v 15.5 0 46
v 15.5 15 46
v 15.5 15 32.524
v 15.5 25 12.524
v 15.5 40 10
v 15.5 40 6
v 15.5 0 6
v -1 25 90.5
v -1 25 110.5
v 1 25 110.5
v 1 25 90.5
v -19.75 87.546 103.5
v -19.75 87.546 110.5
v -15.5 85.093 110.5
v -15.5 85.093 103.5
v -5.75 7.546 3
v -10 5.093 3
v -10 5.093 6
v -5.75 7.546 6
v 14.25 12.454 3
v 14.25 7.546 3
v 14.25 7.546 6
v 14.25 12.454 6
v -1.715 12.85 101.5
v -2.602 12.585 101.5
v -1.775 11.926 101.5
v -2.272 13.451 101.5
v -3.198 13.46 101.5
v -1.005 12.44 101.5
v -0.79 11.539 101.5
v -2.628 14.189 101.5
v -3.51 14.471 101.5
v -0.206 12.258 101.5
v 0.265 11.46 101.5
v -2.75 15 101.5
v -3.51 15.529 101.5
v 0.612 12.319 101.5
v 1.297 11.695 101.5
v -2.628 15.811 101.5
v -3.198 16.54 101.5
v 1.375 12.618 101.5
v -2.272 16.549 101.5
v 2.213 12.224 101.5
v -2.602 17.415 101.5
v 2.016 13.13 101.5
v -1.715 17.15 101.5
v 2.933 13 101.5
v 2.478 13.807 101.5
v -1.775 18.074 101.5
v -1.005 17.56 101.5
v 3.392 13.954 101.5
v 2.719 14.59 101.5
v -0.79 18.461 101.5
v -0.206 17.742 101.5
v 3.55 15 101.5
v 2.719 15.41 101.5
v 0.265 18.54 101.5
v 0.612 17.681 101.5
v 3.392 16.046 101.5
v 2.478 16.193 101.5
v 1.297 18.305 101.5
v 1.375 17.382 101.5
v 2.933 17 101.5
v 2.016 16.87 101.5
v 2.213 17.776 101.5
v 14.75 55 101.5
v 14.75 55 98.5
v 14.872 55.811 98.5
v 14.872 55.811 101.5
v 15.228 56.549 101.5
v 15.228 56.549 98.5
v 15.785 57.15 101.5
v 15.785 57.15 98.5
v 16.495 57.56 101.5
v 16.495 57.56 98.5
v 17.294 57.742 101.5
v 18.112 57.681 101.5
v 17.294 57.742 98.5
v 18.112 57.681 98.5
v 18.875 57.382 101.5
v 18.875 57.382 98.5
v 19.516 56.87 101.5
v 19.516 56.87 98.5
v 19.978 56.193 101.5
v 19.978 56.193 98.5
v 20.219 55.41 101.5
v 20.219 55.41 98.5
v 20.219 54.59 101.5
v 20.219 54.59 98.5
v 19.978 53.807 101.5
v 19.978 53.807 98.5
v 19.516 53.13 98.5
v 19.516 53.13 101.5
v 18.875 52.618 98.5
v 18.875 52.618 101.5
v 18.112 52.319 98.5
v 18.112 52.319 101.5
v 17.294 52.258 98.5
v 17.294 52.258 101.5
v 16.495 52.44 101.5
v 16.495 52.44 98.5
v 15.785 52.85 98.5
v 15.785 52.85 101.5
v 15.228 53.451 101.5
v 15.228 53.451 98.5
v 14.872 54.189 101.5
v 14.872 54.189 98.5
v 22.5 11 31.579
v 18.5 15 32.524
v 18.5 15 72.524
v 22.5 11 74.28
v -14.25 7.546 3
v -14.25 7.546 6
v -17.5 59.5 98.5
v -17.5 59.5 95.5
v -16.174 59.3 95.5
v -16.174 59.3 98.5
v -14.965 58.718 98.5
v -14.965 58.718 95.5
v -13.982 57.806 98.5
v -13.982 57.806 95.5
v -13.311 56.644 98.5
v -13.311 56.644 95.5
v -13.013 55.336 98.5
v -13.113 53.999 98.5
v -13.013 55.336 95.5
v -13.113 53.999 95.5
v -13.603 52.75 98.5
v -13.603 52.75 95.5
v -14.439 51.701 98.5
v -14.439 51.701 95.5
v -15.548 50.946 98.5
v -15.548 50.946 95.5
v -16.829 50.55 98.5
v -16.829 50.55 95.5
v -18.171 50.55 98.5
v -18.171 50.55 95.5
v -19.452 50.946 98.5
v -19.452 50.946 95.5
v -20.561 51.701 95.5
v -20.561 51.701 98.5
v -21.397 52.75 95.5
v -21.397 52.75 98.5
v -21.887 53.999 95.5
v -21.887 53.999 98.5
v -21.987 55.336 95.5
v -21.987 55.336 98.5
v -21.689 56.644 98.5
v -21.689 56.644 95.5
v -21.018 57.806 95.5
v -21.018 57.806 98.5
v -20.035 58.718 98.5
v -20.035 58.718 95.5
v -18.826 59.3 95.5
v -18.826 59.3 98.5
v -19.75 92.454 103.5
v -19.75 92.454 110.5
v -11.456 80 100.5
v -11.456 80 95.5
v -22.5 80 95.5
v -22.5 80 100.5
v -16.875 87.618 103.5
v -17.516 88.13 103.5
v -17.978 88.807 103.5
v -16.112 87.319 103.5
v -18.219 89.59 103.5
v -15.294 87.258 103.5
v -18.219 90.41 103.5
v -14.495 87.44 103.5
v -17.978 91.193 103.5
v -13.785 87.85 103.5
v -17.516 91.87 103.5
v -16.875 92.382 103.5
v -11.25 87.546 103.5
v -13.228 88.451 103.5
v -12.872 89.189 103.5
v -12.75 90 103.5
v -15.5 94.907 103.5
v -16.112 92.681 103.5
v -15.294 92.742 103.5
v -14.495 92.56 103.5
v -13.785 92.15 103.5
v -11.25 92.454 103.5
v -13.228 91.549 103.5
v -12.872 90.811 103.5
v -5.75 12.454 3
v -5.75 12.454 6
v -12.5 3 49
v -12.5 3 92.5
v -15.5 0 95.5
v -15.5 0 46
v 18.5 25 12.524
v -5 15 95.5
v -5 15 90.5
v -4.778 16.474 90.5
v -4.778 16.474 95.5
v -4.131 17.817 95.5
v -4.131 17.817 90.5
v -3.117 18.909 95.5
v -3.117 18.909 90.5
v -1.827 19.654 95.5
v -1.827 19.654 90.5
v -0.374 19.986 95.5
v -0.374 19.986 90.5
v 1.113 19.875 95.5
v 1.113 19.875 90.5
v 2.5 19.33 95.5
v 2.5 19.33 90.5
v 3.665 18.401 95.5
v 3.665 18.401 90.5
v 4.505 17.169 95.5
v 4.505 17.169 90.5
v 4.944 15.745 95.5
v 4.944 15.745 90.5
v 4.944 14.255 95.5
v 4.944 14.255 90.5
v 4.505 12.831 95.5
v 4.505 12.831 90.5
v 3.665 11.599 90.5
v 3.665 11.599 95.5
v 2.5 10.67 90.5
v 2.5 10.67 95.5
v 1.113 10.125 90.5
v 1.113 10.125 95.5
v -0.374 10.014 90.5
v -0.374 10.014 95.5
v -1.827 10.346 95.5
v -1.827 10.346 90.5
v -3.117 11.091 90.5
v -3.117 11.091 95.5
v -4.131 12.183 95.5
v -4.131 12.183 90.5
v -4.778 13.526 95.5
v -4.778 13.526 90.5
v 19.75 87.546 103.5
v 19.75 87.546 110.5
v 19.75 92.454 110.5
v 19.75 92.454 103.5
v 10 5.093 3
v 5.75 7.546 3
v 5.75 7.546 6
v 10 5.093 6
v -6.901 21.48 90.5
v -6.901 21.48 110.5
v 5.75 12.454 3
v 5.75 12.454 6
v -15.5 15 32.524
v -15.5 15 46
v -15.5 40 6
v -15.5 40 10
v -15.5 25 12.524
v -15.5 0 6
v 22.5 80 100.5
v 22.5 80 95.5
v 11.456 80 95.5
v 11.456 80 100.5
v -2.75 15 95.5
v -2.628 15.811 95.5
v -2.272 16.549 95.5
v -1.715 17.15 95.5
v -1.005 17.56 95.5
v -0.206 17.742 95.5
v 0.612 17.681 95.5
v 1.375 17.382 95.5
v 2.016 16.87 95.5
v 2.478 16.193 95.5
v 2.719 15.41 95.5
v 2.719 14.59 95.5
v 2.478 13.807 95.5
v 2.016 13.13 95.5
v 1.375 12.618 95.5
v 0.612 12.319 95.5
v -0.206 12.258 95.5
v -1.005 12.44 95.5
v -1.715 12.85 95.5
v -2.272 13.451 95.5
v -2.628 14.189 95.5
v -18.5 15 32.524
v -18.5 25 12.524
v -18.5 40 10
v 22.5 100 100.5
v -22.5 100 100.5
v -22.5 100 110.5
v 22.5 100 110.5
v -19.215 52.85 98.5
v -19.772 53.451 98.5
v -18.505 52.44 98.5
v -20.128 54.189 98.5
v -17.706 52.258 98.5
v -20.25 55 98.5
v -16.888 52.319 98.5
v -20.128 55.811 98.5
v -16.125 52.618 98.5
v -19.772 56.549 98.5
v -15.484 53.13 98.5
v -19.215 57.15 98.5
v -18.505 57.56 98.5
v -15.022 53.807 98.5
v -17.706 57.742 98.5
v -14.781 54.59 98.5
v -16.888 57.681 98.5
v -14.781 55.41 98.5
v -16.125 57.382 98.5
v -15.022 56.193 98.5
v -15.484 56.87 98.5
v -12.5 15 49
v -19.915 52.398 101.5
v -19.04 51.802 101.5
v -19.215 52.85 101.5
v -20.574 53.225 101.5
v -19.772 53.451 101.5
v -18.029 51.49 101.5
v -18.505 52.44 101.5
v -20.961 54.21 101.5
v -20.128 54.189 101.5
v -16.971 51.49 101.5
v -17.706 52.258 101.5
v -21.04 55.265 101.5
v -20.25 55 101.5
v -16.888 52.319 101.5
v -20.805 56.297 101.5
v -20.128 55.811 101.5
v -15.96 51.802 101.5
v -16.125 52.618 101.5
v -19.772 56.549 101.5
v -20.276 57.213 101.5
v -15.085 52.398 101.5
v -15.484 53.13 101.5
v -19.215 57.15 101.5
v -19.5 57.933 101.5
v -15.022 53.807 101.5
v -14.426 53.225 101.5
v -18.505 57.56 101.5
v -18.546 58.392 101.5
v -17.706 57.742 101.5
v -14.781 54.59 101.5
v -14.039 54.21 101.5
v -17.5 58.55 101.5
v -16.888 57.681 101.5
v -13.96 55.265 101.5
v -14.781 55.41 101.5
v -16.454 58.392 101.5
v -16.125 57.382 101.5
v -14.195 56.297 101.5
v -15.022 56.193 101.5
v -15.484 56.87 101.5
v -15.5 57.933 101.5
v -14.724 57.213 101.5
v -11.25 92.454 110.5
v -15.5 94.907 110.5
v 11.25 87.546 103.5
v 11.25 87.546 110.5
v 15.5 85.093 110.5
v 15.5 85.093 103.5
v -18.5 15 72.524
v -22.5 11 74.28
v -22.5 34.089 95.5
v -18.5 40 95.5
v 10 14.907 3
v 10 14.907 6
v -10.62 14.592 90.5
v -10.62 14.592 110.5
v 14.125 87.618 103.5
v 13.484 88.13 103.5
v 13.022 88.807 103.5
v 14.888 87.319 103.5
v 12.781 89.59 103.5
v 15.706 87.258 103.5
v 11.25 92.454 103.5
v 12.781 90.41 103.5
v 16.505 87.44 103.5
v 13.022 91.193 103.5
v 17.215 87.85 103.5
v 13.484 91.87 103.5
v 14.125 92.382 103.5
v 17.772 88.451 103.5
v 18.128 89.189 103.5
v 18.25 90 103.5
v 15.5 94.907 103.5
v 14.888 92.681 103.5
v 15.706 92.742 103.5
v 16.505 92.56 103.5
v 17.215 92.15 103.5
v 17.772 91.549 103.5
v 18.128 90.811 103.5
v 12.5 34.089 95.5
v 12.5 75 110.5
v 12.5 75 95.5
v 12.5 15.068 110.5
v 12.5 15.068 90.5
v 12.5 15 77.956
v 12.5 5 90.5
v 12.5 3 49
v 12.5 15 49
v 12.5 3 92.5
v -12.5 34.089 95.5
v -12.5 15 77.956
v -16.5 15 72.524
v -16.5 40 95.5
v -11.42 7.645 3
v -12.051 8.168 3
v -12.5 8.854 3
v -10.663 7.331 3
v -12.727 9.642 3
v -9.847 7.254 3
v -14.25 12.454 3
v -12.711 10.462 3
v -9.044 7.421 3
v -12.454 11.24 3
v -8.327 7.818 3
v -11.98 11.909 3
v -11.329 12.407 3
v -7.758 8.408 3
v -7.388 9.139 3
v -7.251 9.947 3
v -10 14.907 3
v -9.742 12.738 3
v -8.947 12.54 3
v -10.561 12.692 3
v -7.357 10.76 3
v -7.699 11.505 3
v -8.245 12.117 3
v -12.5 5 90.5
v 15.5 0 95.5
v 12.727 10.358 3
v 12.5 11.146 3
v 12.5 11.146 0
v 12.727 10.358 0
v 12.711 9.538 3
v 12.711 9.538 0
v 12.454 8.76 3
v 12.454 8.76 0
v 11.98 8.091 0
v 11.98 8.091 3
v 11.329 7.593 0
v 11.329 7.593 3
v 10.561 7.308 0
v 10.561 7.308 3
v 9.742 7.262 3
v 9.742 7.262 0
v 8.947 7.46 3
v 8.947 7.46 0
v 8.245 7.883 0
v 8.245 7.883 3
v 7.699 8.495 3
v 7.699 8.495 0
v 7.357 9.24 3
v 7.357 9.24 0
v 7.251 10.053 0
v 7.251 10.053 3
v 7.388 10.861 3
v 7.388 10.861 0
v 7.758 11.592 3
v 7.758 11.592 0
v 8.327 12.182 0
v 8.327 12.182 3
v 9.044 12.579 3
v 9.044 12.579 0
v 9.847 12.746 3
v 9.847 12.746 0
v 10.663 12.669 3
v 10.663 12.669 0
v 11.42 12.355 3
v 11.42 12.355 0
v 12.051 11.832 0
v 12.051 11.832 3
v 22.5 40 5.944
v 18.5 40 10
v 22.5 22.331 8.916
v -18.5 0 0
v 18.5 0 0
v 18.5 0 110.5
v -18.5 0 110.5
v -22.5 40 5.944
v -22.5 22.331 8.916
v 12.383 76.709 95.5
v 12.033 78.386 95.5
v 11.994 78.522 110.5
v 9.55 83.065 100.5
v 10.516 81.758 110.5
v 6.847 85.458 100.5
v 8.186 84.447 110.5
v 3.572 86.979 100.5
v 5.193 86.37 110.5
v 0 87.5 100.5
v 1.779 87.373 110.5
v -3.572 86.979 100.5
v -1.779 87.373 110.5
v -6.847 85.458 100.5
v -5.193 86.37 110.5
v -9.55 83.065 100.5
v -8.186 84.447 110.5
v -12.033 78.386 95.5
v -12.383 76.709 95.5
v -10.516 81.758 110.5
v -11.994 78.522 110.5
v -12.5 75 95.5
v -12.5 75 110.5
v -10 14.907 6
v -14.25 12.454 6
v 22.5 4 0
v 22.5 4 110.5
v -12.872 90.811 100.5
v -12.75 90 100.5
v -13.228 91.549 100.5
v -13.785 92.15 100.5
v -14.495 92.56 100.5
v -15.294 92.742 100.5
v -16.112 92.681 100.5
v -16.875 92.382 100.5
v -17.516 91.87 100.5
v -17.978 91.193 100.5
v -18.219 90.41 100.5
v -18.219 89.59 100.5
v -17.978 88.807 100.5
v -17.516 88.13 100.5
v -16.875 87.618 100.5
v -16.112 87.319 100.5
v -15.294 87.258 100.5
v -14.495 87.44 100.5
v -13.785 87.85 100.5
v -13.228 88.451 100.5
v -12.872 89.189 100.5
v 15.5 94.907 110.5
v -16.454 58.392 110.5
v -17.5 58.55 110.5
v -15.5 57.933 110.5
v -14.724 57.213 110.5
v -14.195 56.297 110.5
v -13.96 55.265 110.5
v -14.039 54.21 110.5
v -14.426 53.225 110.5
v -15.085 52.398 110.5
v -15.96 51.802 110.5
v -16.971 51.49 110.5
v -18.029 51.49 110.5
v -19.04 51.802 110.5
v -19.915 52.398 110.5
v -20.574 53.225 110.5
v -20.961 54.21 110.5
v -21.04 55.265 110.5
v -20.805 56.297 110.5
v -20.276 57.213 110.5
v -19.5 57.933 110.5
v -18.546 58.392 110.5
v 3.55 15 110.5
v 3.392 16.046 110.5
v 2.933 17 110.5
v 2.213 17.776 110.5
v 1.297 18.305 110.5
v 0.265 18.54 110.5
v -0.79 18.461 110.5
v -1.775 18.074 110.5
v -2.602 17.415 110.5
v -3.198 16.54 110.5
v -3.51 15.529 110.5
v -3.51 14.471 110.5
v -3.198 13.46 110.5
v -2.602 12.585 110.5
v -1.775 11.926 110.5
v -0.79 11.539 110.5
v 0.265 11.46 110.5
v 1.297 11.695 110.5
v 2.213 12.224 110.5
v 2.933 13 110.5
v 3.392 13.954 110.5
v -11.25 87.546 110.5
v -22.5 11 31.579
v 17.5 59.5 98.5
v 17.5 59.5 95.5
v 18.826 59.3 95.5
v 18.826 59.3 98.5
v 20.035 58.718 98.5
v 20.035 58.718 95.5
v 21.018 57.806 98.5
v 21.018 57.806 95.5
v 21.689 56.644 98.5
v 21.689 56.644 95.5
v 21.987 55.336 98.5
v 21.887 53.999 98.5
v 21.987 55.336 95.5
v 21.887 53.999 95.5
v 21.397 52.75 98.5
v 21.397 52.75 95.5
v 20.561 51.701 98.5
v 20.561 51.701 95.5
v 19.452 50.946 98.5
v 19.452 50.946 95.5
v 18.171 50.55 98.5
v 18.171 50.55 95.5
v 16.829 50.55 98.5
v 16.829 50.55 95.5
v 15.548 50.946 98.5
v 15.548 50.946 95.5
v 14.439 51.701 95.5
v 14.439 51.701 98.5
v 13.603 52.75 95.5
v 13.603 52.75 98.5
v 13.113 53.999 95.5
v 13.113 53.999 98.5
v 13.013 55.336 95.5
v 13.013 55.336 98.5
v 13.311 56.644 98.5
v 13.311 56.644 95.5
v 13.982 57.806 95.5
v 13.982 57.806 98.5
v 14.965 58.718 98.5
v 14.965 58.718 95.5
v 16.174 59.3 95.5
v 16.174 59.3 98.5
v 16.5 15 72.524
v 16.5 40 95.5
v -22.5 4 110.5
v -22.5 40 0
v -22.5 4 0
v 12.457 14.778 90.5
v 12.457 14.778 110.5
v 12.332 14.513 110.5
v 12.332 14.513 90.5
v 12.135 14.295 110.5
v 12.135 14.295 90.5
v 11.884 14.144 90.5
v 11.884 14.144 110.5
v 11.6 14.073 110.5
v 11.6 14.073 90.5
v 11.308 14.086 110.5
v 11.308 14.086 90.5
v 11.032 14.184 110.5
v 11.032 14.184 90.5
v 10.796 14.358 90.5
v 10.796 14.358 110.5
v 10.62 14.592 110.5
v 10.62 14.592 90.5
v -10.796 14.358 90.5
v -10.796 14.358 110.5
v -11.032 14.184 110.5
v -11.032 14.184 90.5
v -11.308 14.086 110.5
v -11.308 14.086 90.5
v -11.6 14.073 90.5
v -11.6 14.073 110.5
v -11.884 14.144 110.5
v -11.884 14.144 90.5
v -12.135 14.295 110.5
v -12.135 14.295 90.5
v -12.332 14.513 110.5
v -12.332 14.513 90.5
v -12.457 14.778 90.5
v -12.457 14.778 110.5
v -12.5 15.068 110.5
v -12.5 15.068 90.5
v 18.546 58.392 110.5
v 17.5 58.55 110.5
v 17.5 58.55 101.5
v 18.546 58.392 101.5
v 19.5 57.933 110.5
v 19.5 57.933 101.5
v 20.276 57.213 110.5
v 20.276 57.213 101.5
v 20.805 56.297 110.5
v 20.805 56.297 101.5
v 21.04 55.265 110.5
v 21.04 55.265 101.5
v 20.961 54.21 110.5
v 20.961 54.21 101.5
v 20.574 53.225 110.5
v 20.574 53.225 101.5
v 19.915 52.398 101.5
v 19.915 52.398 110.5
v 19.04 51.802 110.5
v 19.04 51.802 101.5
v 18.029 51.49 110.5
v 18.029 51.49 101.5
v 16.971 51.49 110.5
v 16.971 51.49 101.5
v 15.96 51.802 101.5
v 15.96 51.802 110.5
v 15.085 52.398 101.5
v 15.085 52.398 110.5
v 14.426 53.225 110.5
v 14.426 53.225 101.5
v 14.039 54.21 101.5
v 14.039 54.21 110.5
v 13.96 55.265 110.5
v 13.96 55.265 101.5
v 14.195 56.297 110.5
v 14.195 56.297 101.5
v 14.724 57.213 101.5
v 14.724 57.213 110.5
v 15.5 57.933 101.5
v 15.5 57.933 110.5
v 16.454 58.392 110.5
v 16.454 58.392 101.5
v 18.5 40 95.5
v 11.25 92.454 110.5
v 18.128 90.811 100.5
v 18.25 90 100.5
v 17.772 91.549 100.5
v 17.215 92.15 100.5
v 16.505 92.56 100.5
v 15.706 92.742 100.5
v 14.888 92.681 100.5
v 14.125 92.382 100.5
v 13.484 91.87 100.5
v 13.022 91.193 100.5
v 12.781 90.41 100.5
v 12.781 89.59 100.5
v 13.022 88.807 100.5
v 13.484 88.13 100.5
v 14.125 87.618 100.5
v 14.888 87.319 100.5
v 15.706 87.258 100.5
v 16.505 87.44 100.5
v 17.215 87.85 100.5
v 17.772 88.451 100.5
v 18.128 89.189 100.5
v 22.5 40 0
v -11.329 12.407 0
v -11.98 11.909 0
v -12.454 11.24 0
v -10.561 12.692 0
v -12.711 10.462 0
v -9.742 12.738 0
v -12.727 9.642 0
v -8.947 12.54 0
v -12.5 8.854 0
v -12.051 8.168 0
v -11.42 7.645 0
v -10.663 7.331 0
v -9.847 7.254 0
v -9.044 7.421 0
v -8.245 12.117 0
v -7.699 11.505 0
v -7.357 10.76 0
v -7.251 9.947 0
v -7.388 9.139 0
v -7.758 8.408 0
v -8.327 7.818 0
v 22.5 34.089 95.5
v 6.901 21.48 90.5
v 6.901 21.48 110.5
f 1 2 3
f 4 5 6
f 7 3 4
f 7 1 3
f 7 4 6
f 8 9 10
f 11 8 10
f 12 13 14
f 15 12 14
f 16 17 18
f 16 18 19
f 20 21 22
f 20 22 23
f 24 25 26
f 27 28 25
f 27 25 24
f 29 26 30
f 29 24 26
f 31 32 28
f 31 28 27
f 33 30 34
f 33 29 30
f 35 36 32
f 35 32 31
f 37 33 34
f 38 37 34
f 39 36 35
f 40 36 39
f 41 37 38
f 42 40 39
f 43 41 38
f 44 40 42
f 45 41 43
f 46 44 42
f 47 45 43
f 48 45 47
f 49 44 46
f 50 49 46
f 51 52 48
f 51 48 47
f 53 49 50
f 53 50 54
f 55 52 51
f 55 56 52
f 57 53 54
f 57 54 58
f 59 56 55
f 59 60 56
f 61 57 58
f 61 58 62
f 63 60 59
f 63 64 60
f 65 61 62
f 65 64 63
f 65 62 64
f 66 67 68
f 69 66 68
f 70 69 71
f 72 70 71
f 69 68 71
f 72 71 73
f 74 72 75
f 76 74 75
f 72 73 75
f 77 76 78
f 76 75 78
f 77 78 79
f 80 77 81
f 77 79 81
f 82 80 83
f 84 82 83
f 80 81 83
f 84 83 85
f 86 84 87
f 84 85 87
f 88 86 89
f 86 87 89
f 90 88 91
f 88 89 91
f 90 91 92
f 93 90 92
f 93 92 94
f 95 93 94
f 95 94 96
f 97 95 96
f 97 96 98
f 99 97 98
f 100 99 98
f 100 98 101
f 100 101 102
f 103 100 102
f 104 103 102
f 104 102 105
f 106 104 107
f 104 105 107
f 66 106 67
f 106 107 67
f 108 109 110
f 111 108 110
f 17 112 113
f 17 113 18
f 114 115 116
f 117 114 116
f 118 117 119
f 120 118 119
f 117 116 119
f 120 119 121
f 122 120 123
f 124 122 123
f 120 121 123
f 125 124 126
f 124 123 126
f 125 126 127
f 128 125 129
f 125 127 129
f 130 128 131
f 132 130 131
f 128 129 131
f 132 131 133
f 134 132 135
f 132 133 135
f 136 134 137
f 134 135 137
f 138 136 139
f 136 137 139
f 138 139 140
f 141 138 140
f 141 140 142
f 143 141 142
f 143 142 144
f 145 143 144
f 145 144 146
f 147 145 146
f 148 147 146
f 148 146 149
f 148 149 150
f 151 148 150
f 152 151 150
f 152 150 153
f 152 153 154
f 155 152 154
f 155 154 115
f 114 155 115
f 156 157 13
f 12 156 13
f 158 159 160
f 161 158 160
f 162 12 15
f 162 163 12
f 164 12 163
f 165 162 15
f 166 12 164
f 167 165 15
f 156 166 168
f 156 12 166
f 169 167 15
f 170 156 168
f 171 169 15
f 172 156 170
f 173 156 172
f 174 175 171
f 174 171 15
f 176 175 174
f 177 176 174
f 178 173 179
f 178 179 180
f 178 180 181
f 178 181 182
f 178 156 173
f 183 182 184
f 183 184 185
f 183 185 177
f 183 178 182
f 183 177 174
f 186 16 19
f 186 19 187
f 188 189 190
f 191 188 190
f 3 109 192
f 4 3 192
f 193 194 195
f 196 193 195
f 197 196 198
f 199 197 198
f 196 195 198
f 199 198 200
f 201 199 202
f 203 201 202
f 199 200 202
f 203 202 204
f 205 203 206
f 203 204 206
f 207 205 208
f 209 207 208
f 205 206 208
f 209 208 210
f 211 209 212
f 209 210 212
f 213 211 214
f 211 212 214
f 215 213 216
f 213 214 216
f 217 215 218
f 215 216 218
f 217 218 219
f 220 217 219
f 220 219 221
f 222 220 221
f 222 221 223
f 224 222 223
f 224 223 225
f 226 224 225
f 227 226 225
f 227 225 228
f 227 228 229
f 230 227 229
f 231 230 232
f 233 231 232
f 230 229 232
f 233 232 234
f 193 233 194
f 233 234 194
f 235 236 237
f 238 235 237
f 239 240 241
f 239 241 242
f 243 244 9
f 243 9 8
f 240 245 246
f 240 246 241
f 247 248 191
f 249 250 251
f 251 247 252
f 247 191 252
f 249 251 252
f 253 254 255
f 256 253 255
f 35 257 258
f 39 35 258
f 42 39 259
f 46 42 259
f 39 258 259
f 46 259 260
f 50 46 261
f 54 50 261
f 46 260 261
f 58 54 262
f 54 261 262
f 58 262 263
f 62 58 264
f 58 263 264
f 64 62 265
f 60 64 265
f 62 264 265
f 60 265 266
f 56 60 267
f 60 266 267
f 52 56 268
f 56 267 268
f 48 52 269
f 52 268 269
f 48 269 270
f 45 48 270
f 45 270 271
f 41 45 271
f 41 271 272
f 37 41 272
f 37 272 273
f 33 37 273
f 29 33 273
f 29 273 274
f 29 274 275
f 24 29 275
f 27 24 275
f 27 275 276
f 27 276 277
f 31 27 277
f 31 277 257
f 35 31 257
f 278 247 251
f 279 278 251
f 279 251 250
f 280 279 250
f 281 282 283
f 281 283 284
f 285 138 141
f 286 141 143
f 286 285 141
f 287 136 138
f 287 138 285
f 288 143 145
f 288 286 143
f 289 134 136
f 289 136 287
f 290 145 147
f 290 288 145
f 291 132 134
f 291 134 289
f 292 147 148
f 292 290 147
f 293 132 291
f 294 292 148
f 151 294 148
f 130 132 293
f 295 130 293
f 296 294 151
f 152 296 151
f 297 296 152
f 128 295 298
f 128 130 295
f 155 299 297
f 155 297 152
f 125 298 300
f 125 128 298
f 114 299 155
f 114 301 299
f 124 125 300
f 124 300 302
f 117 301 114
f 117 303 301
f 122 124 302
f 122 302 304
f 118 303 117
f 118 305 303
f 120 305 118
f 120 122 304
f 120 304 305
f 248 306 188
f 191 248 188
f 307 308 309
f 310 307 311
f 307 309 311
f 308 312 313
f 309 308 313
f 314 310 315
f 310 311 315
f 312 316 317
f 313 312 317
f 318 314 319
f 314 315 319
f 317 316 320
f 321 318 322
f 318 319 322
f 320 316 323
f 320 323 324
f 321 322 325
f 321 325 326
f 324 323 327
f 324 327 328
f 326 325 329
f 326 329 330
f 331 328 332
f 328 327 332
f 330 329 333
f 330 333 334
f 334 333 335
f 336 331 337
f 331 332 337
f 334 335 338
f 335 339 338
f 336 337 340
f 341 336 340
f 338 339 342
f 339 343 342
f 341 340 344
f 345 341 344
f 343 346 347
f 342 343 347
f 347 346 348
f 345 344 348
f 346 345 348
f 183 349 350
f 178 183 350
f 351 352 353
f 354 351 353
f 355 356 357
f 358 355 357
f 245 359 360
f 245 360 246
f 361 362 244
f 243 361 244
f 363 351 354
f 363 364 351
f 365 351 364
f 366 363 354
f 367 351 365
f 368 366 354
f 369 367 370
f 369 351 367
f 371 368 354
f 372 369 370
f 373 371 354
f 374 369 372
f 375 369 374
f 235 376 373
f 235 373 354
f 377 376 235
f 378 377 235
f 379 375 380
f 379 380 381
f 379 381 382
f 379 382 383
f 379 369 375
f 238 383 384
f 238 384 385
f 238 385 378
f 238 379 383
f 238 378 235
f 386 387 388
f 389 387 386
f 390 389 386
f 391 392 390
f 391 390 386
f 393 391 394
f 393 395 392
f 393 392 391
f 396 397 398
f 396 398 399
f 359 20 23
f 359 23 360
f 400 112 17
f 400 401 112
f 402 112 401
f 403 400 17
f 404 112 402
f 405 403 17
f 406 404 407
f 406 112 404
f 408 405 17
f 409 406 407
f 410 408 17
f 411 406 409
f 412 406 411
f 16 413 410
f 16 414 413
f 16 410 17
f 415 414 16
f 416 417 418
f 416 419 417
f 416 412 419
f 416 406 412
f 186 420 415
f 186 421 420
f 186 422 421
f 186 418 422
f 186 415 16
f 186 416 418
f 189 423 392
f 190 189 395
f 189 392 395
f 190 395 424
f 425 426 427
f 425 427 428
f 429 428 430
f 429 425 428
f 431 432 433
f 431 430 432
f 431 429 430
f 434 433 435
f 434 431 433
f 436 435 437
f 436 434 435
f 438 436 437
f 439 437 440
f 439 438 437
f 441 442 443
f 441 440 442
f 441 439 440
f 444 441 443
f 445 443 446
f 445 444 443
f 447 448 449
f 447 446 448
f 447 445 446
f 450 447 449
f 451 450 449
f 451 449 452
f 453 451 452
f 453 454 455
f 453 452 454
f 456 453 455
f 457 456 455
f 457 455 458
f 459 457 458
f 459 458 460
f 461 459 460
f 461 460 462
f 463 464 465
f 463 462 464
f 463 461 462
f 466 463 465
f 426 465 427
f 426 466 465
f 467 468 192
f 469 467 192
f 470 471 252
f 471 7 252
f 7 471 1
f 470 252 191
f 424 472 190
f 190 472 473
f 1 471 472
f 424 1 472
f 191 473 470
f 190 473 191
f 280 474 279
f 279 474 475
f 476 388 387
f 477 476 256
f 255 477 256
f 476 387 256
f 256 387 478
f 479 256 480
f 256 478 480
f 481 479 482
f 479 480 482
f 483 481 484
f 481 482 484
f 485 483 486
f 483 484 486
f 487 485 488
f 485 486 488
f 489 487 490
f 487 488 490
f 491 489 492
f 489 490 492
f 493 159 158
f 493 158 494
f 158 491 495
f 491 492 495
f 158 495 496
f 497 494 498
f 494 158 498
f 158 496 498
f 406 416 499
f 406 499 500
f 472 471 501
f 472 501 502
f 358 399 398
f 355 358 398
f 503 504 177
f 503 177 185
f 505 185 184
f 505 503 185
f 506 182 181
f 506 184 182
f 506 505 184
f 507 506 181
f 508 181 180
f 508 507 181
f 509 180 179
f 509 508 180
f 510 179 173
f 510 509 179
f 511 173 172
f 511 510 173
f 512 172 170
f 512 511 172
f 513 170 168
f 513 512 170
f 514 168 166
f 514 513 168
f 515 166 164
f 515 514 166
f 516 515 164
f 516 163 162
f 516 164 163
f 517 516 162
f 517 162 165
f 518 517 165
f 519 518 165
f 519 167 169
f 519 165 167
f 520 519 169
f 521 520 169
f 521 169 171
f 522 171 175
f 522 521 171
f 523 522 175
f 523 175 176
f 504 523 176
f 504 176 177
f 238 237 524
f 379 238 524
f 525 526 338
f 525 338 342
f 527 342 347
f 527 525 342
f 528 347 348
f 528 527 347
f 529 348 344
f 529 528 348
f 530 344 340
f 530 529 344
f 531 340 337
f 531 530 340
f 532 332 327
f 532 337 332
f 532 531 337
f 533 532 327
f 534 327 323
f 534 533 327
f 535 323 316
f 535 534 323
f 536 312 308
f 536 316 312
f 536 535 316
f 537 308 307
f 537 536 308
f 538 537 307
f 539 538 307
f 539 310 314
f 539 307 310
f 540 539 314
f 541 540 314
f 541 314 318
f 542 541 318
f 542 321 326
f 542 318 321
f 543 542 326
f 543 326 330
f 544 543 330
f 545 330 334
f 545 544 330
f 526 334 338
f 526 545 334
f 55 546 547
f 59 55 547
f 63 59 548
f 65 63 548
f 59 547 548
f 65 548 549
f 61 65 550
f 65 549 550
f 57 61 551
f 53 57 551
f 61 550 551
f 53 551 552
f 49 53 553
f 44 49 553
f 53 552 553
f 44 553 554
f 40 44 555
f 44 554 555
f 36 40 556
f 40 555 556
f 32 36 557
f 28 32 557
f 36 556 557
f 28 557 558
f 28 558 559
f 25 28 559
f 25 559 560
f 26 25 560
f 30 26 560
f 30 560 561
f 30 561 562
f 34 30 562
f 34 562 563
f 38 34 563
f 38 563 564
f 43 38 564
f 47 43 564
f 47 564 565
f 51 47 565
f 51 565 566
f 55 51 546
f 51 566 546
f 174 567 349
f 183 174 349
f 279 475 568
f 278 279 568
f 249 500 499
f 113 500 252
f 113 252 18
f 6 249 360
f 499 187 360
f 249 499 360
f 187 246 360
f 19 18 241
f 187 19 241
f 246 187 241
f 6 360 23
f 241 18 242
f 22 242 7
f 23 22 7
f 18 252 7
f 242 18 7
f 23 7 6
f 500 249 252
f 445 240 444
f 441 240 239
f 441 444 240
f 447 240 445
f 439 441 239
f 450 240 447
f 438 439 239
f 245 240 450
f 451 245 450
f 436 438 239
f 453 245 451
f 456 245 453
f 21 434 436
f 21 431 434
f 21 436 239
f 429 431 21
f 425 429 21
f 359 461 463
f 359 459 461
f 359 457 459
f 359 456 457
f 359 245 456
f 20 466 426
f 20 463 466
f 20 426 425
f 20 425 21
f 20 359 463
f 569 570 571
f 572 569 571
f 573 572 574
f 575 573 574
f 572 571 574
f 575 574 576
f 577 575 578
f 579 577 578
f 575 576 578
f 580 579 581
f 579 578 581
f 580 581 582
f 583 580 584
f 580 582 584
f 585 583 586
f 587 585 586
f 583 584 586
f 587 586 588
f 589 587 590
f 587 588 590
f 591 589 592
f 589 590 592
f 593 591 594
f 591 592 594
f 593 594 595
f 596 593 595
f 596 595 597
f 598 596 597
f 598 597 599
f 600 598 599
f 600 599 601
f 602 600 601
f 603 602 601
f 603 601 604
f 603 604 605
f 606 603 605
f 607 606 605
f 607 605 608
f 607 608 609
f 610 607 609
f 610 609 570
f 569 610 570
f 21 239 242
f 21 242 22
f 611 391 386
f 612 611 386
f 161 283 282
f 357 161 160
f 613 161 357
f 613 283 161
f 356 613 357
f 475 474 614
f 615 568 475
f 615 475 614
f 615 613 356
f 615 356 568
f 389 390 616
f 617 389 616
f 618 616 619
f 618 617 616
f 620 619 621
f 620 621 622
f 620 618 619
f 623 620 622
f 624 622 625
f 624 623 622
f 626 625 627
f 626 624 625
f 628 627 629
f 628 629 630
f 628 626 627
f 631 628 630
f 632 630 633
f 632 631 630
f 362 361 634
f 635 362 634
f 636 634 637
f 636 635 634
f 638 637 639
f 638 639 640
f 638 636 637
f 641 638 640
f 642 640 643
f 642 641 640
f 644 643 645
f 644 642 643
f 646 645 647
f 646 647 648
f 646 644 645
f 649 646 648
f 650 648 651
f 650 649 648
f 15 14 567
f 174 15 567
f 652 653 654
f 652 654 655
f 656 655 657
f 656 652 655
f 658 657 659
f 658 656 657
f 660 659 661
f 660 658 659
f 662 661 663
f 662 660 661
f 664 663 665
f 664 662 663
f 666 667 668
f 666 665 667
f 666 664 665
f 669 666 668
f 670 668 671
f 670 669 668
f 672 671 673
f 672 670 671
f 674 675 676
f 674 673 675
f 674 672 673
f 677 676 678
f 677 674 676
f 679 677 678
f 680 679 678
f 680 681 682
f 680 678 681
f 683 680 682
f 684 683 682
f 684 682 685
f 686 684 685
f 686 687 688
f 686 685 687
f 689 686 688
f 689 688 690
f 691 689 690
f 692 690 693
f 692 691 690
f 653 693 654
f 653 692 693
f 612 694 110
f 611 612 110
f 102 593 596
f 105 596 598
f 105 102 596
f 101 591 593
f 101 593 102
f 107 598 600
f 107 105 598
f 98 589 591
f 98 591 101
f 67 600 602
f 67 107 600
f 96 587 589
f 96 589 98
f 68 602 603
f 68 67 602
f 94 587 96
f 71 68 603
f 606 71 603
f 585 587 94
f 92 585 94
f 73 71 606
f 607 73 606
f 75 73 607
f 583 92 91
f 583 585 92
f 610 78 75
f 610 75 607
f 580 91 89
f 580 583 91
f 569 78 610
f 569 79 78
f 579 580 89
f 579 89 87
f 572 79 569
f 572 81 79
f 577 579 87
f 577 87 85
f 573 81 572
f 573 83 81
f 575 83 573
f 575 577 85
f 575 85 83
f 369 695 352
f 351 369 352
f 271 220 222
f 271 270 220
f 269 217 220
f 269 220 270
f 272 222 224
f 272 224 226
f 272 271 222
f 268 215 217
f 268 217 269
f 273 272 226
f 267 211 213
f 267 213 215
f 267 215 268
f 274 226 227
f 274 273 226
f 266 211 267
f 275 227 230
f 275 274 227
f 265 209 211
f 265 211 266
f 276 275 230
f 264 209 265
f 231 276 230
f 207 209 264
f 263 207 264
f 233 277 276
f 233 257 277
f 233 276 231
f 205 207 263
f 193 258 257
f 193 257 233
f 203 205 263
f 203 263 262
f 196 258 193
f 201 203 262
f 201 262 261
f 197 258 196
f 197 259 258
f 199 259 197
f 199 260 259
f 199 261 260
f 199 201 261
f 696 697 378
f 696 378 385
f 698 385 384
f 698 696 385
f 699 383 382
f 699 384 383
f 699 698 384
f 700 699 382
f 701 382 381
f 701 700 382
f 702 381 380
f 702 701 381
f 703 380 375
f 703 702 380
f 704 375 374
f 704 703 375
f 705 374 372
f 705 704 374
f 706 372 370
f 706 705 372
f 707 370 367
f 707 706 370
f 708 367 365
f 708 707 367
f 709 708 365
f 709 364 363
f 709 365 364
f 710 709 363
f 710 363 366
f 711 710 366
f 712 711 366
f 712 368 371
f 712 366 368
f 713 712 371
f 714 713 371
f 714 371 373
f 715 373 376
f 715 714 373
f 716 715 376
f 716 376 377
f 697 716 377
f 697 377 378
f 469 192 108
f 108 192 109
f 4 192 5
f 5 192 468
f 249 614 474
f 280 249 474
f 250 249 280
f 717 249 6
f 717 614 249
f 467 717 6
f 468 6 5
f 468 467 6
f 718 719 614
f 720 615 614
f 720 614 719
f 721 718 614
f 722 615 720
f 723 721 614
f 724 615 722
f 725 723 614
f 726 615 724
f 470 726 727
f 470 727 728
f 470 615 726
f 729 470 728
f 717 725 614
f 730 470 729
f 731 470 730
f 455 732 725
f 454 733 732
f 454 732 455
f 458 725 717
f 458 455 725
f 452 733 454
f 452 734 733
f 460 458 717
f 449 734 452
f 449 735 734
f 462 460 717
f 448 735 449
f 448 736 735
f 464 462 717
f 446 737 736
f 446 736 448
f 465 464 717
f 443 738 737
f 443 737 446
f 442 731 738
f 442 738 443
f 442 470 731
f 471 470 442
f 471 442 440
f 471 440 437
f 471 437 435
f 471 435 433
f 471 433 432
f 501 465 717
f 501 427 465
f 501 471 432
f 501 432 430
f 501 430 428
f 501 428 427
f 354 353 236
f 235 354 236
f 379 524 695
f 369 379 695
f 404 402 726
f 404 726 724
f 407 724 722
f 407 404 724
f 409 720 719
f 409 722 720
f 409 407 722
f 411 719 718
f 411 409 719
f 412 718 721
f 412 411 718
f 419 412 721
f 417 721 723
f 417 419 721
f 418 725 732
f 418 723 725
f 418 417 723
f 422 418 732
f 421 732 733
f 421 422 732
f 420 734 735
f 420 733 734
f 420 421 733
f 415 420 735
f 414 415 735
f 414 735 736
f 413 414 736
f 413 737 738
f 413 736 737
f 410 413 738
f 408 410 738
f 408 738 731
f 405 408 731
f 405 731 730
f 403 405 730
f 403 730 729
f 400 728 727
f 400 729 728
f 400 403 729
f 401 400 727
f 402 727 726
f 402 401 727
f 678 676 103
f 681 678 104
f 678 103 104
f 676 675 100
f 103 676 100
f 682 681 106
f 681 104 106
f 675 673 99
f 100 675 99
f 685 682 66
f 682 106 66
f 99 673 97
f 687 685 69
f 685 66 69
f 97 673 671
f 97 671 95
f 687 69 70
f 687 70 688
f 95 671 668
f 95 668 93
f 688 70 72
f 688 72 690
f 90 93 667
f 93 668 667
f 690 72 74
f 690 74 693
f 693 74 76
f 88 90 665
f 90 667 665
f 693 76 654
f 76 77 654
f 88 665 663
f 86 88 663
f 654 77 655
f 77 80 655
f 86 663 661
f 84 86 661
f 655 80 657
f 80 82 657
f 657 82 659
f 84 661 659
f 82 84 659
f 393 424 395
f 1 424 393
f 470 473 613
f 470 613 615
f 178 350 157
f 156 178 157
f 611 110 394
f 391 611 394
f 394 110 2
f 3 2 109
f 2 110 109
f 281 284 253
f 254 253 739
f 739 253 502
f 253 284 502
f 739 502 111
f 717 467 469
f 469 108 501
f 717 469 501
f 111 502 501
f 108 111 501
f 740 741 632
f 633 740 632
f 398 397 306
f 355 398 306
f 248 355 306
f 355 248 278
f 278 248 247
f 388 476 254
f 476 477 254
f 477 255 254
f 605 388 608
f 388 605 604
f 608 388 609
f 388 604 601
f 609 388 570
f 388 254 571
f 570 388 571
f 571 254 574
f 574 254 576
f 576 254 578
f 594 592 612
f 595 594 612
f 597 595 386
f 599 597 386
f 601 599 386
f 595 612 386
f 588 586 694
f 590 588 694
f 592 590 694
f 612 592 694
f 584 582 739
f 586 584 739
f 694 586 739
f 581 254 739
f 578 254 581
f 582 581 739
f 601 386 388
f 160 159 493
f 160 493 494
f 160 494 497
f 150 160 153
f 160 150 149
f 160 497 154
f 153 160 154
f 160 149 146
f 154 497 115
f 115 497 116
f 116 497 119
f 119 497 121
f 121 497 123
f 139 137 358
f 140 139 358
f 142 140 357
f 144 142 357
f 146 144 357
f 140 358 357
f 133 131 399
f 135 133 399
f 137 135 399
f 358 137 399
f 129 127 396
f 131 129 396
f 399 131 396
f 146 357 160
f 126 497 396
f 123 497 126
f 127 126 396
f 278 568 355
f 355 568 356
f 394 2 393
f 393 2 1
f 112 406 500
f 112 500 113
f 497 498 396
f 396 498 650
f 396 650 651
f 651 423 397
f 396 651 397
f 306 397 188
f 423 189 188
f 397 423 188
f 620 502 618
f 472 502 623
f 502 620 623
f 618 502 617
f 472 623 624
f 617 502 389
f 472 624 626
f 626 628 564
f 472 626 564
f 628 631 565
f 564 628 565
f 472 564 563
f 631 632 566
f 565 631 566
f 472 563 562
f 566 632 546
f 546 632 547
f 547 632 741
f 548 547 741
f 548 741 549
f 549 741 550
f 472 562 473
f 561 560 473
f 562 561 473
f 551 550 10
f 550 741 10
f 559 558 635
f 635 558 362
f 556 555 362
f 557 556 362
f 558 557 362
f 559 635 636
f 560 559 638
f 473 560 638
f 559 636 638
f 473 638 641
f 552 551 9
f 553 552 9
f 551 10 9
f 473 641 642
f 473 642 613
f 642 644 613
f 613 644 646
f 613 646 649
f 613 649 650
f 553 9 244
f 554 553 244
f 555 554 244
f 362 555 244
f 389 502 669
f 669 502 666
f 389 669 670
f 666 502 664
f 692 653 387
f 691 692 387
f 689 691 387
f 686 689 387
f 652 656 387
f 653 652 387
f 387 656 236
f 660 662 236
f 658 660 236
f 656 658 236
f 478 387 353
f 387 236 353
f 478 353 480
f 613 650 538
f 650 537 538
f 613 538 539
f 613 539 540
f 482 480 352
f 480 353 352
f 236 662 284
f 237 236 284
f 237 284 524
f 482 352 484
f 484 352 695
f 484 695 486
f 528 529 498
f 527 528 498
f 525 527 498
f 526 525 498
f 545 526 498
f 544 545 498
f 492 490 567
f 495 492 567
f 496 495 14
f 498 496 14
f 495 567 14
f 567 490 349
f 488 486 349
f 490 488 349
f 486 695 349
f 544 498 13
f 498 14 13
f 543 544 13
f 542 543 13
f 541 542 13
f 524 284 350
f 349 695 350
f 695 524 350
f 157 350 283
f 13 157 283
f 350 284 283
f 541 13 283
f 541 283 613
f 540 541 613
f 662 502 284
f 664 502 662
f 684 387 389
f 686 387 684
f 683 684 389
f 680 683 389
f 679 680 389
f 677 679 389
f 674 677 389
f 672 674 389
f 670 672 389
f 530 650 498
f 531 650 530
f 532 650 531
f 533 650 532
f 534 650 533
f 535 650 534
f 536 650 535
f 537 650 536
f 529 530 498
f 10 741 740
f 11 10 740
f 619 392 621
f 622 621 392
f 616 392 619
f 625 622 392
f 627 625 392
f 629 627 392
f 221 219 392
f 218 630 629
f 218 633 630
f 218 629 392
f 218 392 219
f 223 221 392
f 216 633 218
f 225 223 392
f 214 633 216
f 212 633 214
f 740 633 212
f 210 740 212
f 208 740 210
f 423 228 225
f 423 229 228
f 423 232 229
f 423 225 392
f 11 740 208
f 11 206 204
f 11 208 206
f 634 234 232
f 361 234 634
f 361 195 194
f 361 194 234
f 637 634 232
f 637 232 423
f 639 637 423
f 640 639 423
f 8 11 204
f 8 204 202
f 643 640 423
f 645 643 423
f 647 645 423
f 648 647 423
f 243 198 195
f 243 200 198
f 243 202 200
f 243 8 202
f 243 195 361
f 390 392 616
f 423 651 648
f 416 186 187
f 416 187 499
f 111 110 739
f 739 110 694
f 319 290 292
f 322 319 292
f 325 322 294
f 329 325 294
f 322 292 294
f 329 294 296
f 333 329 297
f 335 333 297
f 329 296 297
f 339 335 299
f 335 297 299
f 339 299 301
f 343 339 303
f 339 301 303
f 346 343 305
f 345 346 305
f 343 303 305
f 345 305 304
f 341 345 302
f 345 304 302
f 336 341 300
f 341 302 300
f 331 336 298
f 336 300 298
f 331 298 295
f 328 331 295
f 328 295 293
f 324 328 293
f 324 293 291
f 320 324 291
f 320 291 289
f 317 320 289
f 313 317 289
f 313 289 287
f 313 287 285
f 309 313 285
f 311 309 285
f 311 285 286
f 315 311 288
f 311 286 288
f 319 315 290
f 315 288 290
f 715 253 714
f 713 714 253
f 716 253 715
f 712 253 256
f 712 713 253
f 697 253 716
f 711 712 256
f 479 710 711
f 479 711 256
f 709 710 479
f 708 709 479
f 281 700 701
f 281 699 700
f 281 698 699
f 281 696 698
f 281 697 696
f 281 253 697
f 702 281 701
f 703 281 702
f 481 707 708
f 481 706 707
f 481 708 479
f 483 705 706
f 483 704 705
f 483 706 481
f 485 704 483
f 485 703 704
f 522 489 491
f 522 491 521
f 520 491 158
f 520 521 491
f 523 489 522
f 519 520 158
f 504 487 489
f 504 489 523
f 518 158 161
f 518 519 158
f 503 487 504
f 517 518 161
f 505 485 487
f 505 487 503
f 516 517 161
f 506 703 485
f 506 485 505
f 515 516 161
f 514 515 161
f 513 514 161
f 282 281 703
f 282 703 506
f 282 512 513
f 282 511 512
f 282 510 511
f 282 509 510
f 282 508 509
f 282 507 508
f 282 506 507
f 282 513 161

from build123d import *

# Parameters (mm, degrees)
SKETCH1_W               = 10
SKETCH1_H               = 110.5
BOSS_EXTRUDE1_DEPTH     = 100
BOSS_EXTRUDE1_2_DEPTH   = 100
SKETCH2_W               = 45
SKETCH2_H               = 40
BOSS_EXTRUDE2_DEPTH     = 6
CUT_EXTRUDE1_DEPTH      = 156.676748424
CUT_EXTRUDE1_DEPTH_BACK = 156.676748424
CHAMFER1_SIZE           = 4
CHAMFER2_SIZE           = 4
CUT_EXTRUDE2_DEPTH      = 151.71993896
CUT_EXTRUDE2_DEPTH_BACK = 6
SKETCH4_R               = 2.75
CUT_EXTRUDE3_DEPTH      = 10
CUT_EXTRUDE3_DEPTH_BACK = 3
CUT_EXTRUDE4_DEPTH      = 128.73605599
CUT_EXTRUDE4_DEPTH_BACK = 128.73605599
SKETCH6_W               = 31
SKETCH6_H               = 40
CHAMFER4_SIZE           = 3
BOSS_EXTRUDE3_DEPTH     = 15
CUT_EXTRUDE5_DEPTH      = 151.71993896
CUT_EXTRUDE5_DEPTH_BACK = 151.71993896
SKETCH8_R               = 2.75
CUT_EXTRUDE7_DEPTH      = 141.094610888
CUT_EXTRUDE7_DEPTH_BACK = 141.094610888
SKETCH10_R              = 3.55
SKETCH11_R              = 4.5
CUT_EXTRUDE8_DEPTH      = 6
SKETCH12_W              = 55.745552446
SKETCH12_H              = 24.52298679
CUT_EXTRUDE9_DEPTH      = 5
CUT_EXTRUDE6_DEPTH      = 7
BOSS_EXTRUDE4_START     = 3
SKETCH13_R              = 4.5
SKETCH13_R_2            = 2.75
BOSS_EXTRUDE4_DEPTH     = 3
BOSS_EXTRUDE5_DEPTH     = 20
CHAMFER5_SIZE           = 5
SKETCH15_R              = 2.75
CUT_EXTRUDE11_DEPTH     = 137.735145445
SKETCH16_R              = 3.55
CUT_EXTRUDE12_DEPTH     = 9
SKETCH17_R              = 5
CUT_EXTRUDE13_DEPTH     = 5
CHAMFER6_SIZE           = 4
FILLET1_R               = 1


# Some blends are built 0.0001 mm under size
with BuildPart() as part:
    # Sketch1 → Boss-Extrude1 (new body)
    with BuildSketch(Plane(origin=(0, 0, 0), x_dir=(1, 0, 0), z_dir=(0, 1, 0))):
        with Locations((-17.5, -55.25)):
            Rectangle(SKETCH1_W, SKETCH1_H)
    extrude(amount=BOSS_EXTRUDE1_DEPTH)



with BuildPart() as body_2:
    # Sketch1 → Boss-Extrude1 2 (new body)
    with BuildSketch(Plane(origin=(0, 0, 0), x_dir=(1, 0, 0), z_dir=(0, 1, 0))):
        with Locations((17.5, -55.25)):
            Rectangle(SKETCH1_W, SKETCH1_H)
    extrude(amount=BOSS_EXTRUDE1_2_DEPTH)


with BuildPart() as part_1:
    add(part.part)

    add(body_2.part)  # Boss-Extrude2 merges body 2
    # Sketch2 → Boss-Extrude2 (add)
    with BuildSketch(Plane(origin=(0, 0, 0), x_dir=(-1, 0, 0), z_dir=(0, 0, -1))):
        with Locations((0, 20)):
            Rectangle(SKETCH2_W, SKETCH2_H)
    extrude(amount=-BOSS_EXTRUDE2_DEPTH)

    # Sketch3 → Cut-Extrude1 (cut, two sides: drawn at the far end of the back side and taken through both)
    with BuildSketch(Plane.ZY.offset(22.5).offset(-CUT_EXTRUDE1_DEPTH_BACK)):
        Polygon((95.5, 121.142290582), (95.5, 40), (72.523677048, 15), (32.523677048, 15), (12.523677048, 25), (10, 40), (0, 40), (-7.984339434, 40), (-7.984339434, 121.142290582), align=None)
    extrude(amount=CUT_EXTRUDE1_DEPTH + CUT_EXTRUDE1_DEPTH_BACK, mode=Mode.SUBTRACT)

    # Chamfer1
    chamfer1_edges = [part_1.edges().sort_by_distance(p)[0] for p in [
        (-12.5, 27.5, 84.011838524),
        (12.5, 27.5, 84.011838524),
        (22.5, 32.5, 11.261838524),
        (22.5, 27.5, 84.011838524),
        (22.5, 15, 52.523677048),
        (22.5, 20, 22.523677048),
        (-22.5, 32.5, 11.261838524),
        (-22.5, 27.5, 84.011838524),
        (-22.5, 15, 52.523677048),
        (-22.5, 20, 22.523677048),
    ]]
    chamfer(chamfer1_edges, length=CHAMFER1_SIZE)

    # Chamfer2
    chamfer2_edges = [part_1.edges().sort_by_distance(p)[0] for p in [
        (22.5, 0, 55.25),
        (-22.5, 0, 55.25),
    ]]
    chamfer(chamfer2_edges, length=CHAMFER2_SIZE)

    # Sketch4 → Cut-Extrude2 (cut, two sides: drawn at the far end of the back side and taken through both)
    with BuildSketch(Plane(origin=(0, 0, 0), x_dir=(-1, 0, 0), z_dir=(0, 0, -1)).offset(-CUT_EXTRUDE2_DEPTH_BACK)):
        with Locations(Location((-10, 10, 0), (0, 0, 155.380022671))):
            Circle(SKETCH4_R)
        with Locations(Location((10, 10, 0), (0, 0, 335.380022671))):
            Circle(SKETCH4_R)
    extrude(amount=CUT_EXTRUDE2_DEPTH + CUT_EXTRUDE2_DEPTH_BACK, mode=Mode.SUBTRACT)

    # Sketch5 → Cut-Extrude3 (cut, two sides: drawn at the far end of the back side and taken through both)
    with BuildSketch(Plane.XY.offset(6).offset(-CUT_EXTRUDE3_DEPTH_BACK)):
        Polygon((-10, 14.907477288), (-14.25, 12.453738644), (-14.25, 7.546261356), (-10, 5.092522712), (-5.75, 7.546261356), (-5.75, 12.453738644), align=None)
        Polygon((10, 14.907477288), (5.75, 12.453738644), (5.75, 7.546261356), (10, 5.092522712), (14.25, 7.546261356), (14.25, 12.453738644), align=None)
    extrude(amount=CUT_EXTRUDE3_DEPTH + CUT_EXTRUDE3_DEPTH_BACK, mode=Mode.SUBTRACT)

    # Sketch6 → Cut-Extrude4 (cut, two sides: drawn at the far end of the back side and taken through both)
    with BuildSketch(Plane(origin=(0, 40, 0), x_dir=(1, 0, 0), z_dir=(0, 1, 0)).offset(-CUT_EXTRUDE4_DEPTH_BACK)):
        with Locations((0, -26)):
            Rectangle(SKETCH6_W, SKETCH6_H)
    extrude(amount=CUT_EXTRUDE4_DEPTH + CUT_EXTRUDE4_DEPTH_BACK, mode=Mode.SUBTRACT)

    # Chamfer4
    chamfer4_edges = [part_1.edges().sort_by_distance(p)[0] for p in [
        (12.5, 0, 78.25),
        (12.5, 7.5, 46),
        (-12.5, 0, 78.25),
        (-12.5, 7.5, 46),
    ]]
    chamfer(chamfer4_edges, length=CHAMFER4_SIZE - 0.0001)  # a hair under: the kernel refuses the full size

    # Sketch7 → Boss-Extrude3 (add)
    with BuildSketch(Plane.XY.offset(110.5)):
        with BuildLine():
            Line((-22.5, 100), (22.5, 100))
            Line((22.5, 100), (12.5, 75))
            ThreePointArc((12.5, 75), (0, 87.5), (-12.5, 75))
            Line((-12.5, 75), (-22.5, 100))
        make_face()
    extrude(amount=-BOSS_EXTRUDE3_DEPTH)

    # Sketch8 → Cut-Extrude5 (cut, two sides: drawn at the far end of the back side and taken through both)
    with BuildSketch(Plane.XY.offset(110.5).offset(-CUT_EXTRUDE5_DEPTH_BACK)):
        with Locations((-15.5, 90)):
            Circle(SKETCH8_R)
        with Locations((15.5, 90)):
            Circle(SKETCH8_R)
    extrude(amount=CUT_EXTRUDE5_DEPTH + CUT_EXTRUDE5_DEPTH_BACK, mode=Mode.SUBTRACT)

    # Sketch10 → Cut-Extrude7 (cut, two sides: drawn at the far end of the back side and taken through both)
    with BuildSketch(Plane(origin=(0, 0, 95.5), x_dir=(-1, 0, 0), z_dir=(0, 0, -1)).offset(-CUT_EXTRUDE7_DEPTH_BACK)):
        with Locations(Location((-17.5, 55, 0), (0, 0, 90))):
            Circle(SKETCH10_R)
        with Locations(Location((17.5, 55, 0), (0, 0, 90))):
            Circle(SKETCH10_R)
    extrude(amount=CUT_EXTRUDE7_DEPTH + CUT_EXTRUDE7_DEPTH_BACK, mode=Mode.SUBTRACT)

    # Sketch11 → Cut-Extrude8 (cut)
    with BuildSketch(Plane(origin=(0, 0, 95.5), x_dir=(-1, 0, 0), z_dir=(0, 0, -1))):
        with Locations(Location((-17.5, 55, 0), (0, 0, 90))):
            Circle(SKETCH11_R)
        with Locations(Location((17.5, 55, 0), (0, 0, 90))):
            Circle(SKETCH11_R)
    extrude(amount=-CUT_EXTRUDE8_DEPTH, mode=Mode.SUBTRACT)

    # Sketch12 → Cut-Extrude9 (cut)
    with BuildSketch(Plane(origin=(0, 0, 95.5), x_dir=(-1, 0, 0), z_dir=(0, 0, -1))):
        with Locations((0.490806416, 92.261493395)):
            Rectangle(SKETCH12_W, SKETCH12_H)
    extrude(amount=-CUT_EXTRUDE9_DEPTH, mode=Mode.SUBTRACT)

    # Sketch9 → Cut-Extrude6 (cut)
    with BuildSketch(Plane.XY.offset(110.5)):
        Polygon((-15.5, 94.907477288), (-19.75, 92.453738644), (-19.75, 87.546261356), (-15.5, 85.092522712), (-11.25, 87.546261356), (-11.25, 92.453738644), align=None)
        Polygon((15.5, 94.907477288), (11.25, 92.453738644), (11.25, 87.546261356), (15.5, 85.092522712), (19.75, 87.546261356), (19.75, 92.453738644), align=None)
    extrude(amount=-CUT_EXTRUDE6_DEPTH, mode=Mode.SUBTRACT)

    # Sketch13 → Boss-Extrude4 (add)
    # profile 1 of 2: a face of its own
    with BuildSketch(Plane(origin=(0, 0, 101.5), x_dir=(-1, 0, 0), z_dir=(0, 0, -1)).offset(BOSS_EXTRUDE4_START)):
        with Locations(Location((-17.5, 55, 0), (0, 0, 90))):
            Circle(SKETCH13_R)
        with Locations((-17.5, 55)):
            Circle(SKETCH13_R_2, mode=Mode.SUBTRACT)
    # profile 2 of 2: a face of its own
    with BuildSketch(Plane(origin=(0, 0, 101.5), x_dir=(-1, 0, 0), z_dir=(0, 0, -1)).offset(BOSS_EXTRUDE4_START)):
        with Locations(Location((17.5, 55, 0), (0, 0, 90))):
            Circle(SKETCH13_R)
        with Locations((17.5, 55)):
            Circle(SKETCH13_R_2, mode=Mode.SUBTRACT)
    extrude(amount=-BOSS_EXTRUDE4_DEPTH)

    # Sketch14 → Boss-Extrude5 (add)
    with BuildSketch(Plane.XY.offset(110.5)):
        Polygon((-5, 25), (5, 25), (18.5, 0), (-18.5, 0), align=None)
    extrude(amount=-BOSS_EXTRUDE5_DEPTH)

    # Chamfer5
    # the kernel refuses this chamfer: 5 mm, written as the material it takes off along each edge
    with BuildSketch(Plane(origin=(28.35831494, 0, 90.5), x_dir=(0, 0.9996219169112968, -0.0274958766105877), z_dir=(-1, 0, 0))) as chamfer5_piece_1_section:
        Polygon((CHAMFER5_SIZE * 0.999621916911, -CHAMFER5_SIZE * 0.0274958766106), (-CHAMFER5_SIZE * 0.0274958766106, -CHAMFER5_SIZE * 0.999621916911), (0, 0), align=None)
    chamfer5_piece_1 = extrude(amount=56.71662988, mode=Mode.PRIVATE)
    chamfer5_piece_1 = split(chamfer5_piece_1, bisect_by=Plane(origin=(14.159547874, 1.340352126, 92.611977199), z_dir=(-0.7071067811865475, -0.7071067811865476, 0)), keep=Keep.TOP, mode=Mode.PRIVATE)
    chamfer5_piece_1 = split(chamfer5_piece_1, bisect_by=Plane(origin=(12.5, 0.787169501, 92.611977199), z_dir=(1, 0, 0)), keep=Keep.TOP, mode=Mode.PRIVATE)
    add(chamfer5_piece_1, mode=Mode.SUBTRACT)
    with BuildSketch(Plane(origin=(28.35831494, 0, 90.5), x_dir=(0, 0.9996219169112968, -0.0274958766105877), z_dir=(-1, 0, 0))) as chamfer5_piece_2_section:
        Polygon((CHAMFER5_SIZE * 0.999621916911, -CHAMFER5_SIZE * 0.0274958766106), (-CHAMFER5_SIZE * 0.0274958766106, -CHAMFER5_SIZE * 0.999621916911), (0, 0), align=None)
    chamfer5_piece_2 = extrude(amount=56.71662988, mode=Mode.PRIVATE)
    chamfer5_piece_2 = split(chamfer5_piece_2, bisect_by=Plane(origin=(11.6635791, 3.8363209, 90.857133188), z_dir=(0.7071067811865475, 0.7071067811865476, 0)), keep=Keep.TOP, mode=Mode.PRIVATE)
    chamfer5_piece_2 = split(chamfer5_piece_2, bisect_by=Plane(origin=(12.5, 4.115127867, 90.857133188), z_dir=(-1, 0, 0)), keep=Keep.TOP, mode=Mode.PRIVATE)
    add(chamfer5_piece_2, mode=Mode.SUBTRACT)
    with BuildSketch(Plane(origin=(28.35831494, 0, 90.5), x_dir=(0, 0.9996219169112968, -0.0274958766105877), z_dir=(-1, 0, 0))) as chamfer5_piece_3_section:
        Polygon((CHAMFER5_SIZE * 0.999621916911, -CHAMFER5_SIZE * 0.0274958766106), (-CHAMFER5_SIZE * 0.0274958766106, -CHAMFER5_SIZE * 0.999621916911), (0, 0), align=None)
    chamfer5_piece_3 = extrude(amount=56.71662988, mode=Mode.PRIVATE)
    chamfer5_piece_3 = split(chamfer5_piece_3, bisect_by=Plane(origin=(-6.938143238, 8.561756762, 92.162249501), z_dir=(0.7071067811865475, -0.7071067811865476, 0)), keep=Keep.TOP, mode=Mode.PRIVATE)
    chamfer5_piece_3 = split(chamfer5_piece_3, bisect_by=Plane(origin=(-12.5, 1.623613523, 92.162249501), z_dir=(1, 0, 0)), keep=Keep.TOP, mode=Mode.PRIVATE)
    chamfer5_piece_3 = split(chamfer5_piece_3, bisect_by=Plane(origin=(6.938143238, 8.561756762, 92.162249501), z_dir=(-0.7071067811865475, -0.7071067811865476, 0)), keep=Keep.TOP, mode=Mode.PRIVATE)
    chamfer5_piece_3 = split(chamfer5_piece_3, bisect_by=Plane(origin=(12.5, 1.623613523, 92.162249501), z_dir=(-1, 0, 0)), keep=Keep.TOP, mode=Mode.PRIVATE)
    add(chamfer5_piece_3, mode=Mode.SUBTRACT)
    with BuildSketch(Plane(origin=(28.35831494, 0, 90.5), x_dir=(0, 0.9996219169112968, -0.0274958766105877), z_dir=(-1, 0, 0))) as chamfer5_piece_4_section:
        Polygon((CHAMFER5_SIZE * 0.999621916911, -CHAMFER5_SIZE * 0.0274958766106), (-CHAMFER5_SIZE * 0.0274958766106, -CHAMFER5_SIZE * 0.999621916911), (0, 0), align=None)
    chamfer5_piece_4 = extrude(amount=56.71662988, mode=Mode.PRIVATE)
    chamfer5_piece_4 = split(chamfer5_piece_4, bisect_by=Plane(origin=(-14.159547874, 1.340352126, 92.611977199), z_dir=(0.7071067811865475, -0.7071067811865476, 0)), keep=Keep.TOP, mode=Mode.PRIVATE)
    chamfer5_piece_4 = split(chamfer5_piece_4, bisect_by=Plane(origin=(-12.5, 0.787169501, 92.611977199), z_dir=(-1, 0, 0)), keep=Keep.TOP, mode=Mode.PRIVATE)
    add(chamfer5_piece_4, mode=Mode.SUBTRACT)
    with BuildSketch(Plane(origin=(28.35831494, 0, 90.5), x_dir=(0, 0.9996219169112968, -0.0274958766105877), z_dir=(-1, 0, 0))) as chamfer5_piece_5_section:
        Polygon((CHAMFER5_SIZE * 0.999621916911, -CHAMFER5_SIZE * 0.0274958766106), (-CHAMFER5_SIZE * 0.0274958766106, -CHAMFER5_SIZE * 0.999621916911), (0, 0), align=None)
    chamfer5_piece_5 = extrude(amount=56.71662988, mode=Mode.PRIVATE)
    chamfer5_piece_5 = split(chamfer5_piece_5, bisect_by=Plane(origin=(-11.6635791, 3.8363209, 90.857133188), z_dir=(-0.7071067811865475, 0.7071067811865476, 0)), keep=Keep.TOP, mode=Mode.PRIVATE)
    chamfer5_piece_5 = split(chamfer5_piece_5, bisect_by=Plane(origin=(-12.5, 4.115127867, 90.857133188), z_dir=(1, 0, 0)), keep=Keep.TOP, mode=Mode.PRIVATE)
    add(chamfer5_piece_5, mode=Mode.SUBTRACT)

    # Sketch15 → Cut-Extrude11 (cut, through all)
    with BuildSketch(Plane(origin=(0, 0, 90.5), x_dir=(-1, 0, 0), z_dir=(0, 0, -1))):
        with Locations((0, 15)):
            Circle(SKETCH15_R)
    extrude(amount=-CUT_EXTRUDE11_DEPTH, mode=Mode.SUBTRACT)

    # Sketch16 → Cut-Extrude12 (cut)
    with BuildSketch(Plane.XY.offset(110.5)):
        with Locations((0, 15)):
            Circle(SKETCH16_R)
    extrude(amount=-CUT_EXTRUDE12_DEPTH, mode=Mode.SUBTRACT)

    # Sketch17 → Cut-Extrude13 (cut)
    with BuildSketch(Plane(origin=(0, 0, 90.5), x_dir=(-1, 0, 0), z_dir=(0, 0, -1))):
        with Locations((0, 15)):
            Circle(SKETCH17_R)
    extrude(amount=-CUT_EXTRUDE13_DEPTH, mode=Mode.SUBTRACT)

    # Chamfer6
    chamfer6_edges = [part_1.edges().sort_by_distance(p)[0] for p in [
        (5, 25, 100.5),
        (-5, 25, 100.5),
    ]]
    chamfer(chamfer6_edges, length=CHAMFER6_SIZE)

    # Fillet1
    fillet1_edges = [part_1.edges().sort_by_distance(p)[0] for p in [
        (12.5, 11.111111111, 100.5),
        (-12.5, 11.111111111, 100.5),
    ]]
    fillet(fillet1_edges, radius=FILLET1_R)


solid = part_1.part
